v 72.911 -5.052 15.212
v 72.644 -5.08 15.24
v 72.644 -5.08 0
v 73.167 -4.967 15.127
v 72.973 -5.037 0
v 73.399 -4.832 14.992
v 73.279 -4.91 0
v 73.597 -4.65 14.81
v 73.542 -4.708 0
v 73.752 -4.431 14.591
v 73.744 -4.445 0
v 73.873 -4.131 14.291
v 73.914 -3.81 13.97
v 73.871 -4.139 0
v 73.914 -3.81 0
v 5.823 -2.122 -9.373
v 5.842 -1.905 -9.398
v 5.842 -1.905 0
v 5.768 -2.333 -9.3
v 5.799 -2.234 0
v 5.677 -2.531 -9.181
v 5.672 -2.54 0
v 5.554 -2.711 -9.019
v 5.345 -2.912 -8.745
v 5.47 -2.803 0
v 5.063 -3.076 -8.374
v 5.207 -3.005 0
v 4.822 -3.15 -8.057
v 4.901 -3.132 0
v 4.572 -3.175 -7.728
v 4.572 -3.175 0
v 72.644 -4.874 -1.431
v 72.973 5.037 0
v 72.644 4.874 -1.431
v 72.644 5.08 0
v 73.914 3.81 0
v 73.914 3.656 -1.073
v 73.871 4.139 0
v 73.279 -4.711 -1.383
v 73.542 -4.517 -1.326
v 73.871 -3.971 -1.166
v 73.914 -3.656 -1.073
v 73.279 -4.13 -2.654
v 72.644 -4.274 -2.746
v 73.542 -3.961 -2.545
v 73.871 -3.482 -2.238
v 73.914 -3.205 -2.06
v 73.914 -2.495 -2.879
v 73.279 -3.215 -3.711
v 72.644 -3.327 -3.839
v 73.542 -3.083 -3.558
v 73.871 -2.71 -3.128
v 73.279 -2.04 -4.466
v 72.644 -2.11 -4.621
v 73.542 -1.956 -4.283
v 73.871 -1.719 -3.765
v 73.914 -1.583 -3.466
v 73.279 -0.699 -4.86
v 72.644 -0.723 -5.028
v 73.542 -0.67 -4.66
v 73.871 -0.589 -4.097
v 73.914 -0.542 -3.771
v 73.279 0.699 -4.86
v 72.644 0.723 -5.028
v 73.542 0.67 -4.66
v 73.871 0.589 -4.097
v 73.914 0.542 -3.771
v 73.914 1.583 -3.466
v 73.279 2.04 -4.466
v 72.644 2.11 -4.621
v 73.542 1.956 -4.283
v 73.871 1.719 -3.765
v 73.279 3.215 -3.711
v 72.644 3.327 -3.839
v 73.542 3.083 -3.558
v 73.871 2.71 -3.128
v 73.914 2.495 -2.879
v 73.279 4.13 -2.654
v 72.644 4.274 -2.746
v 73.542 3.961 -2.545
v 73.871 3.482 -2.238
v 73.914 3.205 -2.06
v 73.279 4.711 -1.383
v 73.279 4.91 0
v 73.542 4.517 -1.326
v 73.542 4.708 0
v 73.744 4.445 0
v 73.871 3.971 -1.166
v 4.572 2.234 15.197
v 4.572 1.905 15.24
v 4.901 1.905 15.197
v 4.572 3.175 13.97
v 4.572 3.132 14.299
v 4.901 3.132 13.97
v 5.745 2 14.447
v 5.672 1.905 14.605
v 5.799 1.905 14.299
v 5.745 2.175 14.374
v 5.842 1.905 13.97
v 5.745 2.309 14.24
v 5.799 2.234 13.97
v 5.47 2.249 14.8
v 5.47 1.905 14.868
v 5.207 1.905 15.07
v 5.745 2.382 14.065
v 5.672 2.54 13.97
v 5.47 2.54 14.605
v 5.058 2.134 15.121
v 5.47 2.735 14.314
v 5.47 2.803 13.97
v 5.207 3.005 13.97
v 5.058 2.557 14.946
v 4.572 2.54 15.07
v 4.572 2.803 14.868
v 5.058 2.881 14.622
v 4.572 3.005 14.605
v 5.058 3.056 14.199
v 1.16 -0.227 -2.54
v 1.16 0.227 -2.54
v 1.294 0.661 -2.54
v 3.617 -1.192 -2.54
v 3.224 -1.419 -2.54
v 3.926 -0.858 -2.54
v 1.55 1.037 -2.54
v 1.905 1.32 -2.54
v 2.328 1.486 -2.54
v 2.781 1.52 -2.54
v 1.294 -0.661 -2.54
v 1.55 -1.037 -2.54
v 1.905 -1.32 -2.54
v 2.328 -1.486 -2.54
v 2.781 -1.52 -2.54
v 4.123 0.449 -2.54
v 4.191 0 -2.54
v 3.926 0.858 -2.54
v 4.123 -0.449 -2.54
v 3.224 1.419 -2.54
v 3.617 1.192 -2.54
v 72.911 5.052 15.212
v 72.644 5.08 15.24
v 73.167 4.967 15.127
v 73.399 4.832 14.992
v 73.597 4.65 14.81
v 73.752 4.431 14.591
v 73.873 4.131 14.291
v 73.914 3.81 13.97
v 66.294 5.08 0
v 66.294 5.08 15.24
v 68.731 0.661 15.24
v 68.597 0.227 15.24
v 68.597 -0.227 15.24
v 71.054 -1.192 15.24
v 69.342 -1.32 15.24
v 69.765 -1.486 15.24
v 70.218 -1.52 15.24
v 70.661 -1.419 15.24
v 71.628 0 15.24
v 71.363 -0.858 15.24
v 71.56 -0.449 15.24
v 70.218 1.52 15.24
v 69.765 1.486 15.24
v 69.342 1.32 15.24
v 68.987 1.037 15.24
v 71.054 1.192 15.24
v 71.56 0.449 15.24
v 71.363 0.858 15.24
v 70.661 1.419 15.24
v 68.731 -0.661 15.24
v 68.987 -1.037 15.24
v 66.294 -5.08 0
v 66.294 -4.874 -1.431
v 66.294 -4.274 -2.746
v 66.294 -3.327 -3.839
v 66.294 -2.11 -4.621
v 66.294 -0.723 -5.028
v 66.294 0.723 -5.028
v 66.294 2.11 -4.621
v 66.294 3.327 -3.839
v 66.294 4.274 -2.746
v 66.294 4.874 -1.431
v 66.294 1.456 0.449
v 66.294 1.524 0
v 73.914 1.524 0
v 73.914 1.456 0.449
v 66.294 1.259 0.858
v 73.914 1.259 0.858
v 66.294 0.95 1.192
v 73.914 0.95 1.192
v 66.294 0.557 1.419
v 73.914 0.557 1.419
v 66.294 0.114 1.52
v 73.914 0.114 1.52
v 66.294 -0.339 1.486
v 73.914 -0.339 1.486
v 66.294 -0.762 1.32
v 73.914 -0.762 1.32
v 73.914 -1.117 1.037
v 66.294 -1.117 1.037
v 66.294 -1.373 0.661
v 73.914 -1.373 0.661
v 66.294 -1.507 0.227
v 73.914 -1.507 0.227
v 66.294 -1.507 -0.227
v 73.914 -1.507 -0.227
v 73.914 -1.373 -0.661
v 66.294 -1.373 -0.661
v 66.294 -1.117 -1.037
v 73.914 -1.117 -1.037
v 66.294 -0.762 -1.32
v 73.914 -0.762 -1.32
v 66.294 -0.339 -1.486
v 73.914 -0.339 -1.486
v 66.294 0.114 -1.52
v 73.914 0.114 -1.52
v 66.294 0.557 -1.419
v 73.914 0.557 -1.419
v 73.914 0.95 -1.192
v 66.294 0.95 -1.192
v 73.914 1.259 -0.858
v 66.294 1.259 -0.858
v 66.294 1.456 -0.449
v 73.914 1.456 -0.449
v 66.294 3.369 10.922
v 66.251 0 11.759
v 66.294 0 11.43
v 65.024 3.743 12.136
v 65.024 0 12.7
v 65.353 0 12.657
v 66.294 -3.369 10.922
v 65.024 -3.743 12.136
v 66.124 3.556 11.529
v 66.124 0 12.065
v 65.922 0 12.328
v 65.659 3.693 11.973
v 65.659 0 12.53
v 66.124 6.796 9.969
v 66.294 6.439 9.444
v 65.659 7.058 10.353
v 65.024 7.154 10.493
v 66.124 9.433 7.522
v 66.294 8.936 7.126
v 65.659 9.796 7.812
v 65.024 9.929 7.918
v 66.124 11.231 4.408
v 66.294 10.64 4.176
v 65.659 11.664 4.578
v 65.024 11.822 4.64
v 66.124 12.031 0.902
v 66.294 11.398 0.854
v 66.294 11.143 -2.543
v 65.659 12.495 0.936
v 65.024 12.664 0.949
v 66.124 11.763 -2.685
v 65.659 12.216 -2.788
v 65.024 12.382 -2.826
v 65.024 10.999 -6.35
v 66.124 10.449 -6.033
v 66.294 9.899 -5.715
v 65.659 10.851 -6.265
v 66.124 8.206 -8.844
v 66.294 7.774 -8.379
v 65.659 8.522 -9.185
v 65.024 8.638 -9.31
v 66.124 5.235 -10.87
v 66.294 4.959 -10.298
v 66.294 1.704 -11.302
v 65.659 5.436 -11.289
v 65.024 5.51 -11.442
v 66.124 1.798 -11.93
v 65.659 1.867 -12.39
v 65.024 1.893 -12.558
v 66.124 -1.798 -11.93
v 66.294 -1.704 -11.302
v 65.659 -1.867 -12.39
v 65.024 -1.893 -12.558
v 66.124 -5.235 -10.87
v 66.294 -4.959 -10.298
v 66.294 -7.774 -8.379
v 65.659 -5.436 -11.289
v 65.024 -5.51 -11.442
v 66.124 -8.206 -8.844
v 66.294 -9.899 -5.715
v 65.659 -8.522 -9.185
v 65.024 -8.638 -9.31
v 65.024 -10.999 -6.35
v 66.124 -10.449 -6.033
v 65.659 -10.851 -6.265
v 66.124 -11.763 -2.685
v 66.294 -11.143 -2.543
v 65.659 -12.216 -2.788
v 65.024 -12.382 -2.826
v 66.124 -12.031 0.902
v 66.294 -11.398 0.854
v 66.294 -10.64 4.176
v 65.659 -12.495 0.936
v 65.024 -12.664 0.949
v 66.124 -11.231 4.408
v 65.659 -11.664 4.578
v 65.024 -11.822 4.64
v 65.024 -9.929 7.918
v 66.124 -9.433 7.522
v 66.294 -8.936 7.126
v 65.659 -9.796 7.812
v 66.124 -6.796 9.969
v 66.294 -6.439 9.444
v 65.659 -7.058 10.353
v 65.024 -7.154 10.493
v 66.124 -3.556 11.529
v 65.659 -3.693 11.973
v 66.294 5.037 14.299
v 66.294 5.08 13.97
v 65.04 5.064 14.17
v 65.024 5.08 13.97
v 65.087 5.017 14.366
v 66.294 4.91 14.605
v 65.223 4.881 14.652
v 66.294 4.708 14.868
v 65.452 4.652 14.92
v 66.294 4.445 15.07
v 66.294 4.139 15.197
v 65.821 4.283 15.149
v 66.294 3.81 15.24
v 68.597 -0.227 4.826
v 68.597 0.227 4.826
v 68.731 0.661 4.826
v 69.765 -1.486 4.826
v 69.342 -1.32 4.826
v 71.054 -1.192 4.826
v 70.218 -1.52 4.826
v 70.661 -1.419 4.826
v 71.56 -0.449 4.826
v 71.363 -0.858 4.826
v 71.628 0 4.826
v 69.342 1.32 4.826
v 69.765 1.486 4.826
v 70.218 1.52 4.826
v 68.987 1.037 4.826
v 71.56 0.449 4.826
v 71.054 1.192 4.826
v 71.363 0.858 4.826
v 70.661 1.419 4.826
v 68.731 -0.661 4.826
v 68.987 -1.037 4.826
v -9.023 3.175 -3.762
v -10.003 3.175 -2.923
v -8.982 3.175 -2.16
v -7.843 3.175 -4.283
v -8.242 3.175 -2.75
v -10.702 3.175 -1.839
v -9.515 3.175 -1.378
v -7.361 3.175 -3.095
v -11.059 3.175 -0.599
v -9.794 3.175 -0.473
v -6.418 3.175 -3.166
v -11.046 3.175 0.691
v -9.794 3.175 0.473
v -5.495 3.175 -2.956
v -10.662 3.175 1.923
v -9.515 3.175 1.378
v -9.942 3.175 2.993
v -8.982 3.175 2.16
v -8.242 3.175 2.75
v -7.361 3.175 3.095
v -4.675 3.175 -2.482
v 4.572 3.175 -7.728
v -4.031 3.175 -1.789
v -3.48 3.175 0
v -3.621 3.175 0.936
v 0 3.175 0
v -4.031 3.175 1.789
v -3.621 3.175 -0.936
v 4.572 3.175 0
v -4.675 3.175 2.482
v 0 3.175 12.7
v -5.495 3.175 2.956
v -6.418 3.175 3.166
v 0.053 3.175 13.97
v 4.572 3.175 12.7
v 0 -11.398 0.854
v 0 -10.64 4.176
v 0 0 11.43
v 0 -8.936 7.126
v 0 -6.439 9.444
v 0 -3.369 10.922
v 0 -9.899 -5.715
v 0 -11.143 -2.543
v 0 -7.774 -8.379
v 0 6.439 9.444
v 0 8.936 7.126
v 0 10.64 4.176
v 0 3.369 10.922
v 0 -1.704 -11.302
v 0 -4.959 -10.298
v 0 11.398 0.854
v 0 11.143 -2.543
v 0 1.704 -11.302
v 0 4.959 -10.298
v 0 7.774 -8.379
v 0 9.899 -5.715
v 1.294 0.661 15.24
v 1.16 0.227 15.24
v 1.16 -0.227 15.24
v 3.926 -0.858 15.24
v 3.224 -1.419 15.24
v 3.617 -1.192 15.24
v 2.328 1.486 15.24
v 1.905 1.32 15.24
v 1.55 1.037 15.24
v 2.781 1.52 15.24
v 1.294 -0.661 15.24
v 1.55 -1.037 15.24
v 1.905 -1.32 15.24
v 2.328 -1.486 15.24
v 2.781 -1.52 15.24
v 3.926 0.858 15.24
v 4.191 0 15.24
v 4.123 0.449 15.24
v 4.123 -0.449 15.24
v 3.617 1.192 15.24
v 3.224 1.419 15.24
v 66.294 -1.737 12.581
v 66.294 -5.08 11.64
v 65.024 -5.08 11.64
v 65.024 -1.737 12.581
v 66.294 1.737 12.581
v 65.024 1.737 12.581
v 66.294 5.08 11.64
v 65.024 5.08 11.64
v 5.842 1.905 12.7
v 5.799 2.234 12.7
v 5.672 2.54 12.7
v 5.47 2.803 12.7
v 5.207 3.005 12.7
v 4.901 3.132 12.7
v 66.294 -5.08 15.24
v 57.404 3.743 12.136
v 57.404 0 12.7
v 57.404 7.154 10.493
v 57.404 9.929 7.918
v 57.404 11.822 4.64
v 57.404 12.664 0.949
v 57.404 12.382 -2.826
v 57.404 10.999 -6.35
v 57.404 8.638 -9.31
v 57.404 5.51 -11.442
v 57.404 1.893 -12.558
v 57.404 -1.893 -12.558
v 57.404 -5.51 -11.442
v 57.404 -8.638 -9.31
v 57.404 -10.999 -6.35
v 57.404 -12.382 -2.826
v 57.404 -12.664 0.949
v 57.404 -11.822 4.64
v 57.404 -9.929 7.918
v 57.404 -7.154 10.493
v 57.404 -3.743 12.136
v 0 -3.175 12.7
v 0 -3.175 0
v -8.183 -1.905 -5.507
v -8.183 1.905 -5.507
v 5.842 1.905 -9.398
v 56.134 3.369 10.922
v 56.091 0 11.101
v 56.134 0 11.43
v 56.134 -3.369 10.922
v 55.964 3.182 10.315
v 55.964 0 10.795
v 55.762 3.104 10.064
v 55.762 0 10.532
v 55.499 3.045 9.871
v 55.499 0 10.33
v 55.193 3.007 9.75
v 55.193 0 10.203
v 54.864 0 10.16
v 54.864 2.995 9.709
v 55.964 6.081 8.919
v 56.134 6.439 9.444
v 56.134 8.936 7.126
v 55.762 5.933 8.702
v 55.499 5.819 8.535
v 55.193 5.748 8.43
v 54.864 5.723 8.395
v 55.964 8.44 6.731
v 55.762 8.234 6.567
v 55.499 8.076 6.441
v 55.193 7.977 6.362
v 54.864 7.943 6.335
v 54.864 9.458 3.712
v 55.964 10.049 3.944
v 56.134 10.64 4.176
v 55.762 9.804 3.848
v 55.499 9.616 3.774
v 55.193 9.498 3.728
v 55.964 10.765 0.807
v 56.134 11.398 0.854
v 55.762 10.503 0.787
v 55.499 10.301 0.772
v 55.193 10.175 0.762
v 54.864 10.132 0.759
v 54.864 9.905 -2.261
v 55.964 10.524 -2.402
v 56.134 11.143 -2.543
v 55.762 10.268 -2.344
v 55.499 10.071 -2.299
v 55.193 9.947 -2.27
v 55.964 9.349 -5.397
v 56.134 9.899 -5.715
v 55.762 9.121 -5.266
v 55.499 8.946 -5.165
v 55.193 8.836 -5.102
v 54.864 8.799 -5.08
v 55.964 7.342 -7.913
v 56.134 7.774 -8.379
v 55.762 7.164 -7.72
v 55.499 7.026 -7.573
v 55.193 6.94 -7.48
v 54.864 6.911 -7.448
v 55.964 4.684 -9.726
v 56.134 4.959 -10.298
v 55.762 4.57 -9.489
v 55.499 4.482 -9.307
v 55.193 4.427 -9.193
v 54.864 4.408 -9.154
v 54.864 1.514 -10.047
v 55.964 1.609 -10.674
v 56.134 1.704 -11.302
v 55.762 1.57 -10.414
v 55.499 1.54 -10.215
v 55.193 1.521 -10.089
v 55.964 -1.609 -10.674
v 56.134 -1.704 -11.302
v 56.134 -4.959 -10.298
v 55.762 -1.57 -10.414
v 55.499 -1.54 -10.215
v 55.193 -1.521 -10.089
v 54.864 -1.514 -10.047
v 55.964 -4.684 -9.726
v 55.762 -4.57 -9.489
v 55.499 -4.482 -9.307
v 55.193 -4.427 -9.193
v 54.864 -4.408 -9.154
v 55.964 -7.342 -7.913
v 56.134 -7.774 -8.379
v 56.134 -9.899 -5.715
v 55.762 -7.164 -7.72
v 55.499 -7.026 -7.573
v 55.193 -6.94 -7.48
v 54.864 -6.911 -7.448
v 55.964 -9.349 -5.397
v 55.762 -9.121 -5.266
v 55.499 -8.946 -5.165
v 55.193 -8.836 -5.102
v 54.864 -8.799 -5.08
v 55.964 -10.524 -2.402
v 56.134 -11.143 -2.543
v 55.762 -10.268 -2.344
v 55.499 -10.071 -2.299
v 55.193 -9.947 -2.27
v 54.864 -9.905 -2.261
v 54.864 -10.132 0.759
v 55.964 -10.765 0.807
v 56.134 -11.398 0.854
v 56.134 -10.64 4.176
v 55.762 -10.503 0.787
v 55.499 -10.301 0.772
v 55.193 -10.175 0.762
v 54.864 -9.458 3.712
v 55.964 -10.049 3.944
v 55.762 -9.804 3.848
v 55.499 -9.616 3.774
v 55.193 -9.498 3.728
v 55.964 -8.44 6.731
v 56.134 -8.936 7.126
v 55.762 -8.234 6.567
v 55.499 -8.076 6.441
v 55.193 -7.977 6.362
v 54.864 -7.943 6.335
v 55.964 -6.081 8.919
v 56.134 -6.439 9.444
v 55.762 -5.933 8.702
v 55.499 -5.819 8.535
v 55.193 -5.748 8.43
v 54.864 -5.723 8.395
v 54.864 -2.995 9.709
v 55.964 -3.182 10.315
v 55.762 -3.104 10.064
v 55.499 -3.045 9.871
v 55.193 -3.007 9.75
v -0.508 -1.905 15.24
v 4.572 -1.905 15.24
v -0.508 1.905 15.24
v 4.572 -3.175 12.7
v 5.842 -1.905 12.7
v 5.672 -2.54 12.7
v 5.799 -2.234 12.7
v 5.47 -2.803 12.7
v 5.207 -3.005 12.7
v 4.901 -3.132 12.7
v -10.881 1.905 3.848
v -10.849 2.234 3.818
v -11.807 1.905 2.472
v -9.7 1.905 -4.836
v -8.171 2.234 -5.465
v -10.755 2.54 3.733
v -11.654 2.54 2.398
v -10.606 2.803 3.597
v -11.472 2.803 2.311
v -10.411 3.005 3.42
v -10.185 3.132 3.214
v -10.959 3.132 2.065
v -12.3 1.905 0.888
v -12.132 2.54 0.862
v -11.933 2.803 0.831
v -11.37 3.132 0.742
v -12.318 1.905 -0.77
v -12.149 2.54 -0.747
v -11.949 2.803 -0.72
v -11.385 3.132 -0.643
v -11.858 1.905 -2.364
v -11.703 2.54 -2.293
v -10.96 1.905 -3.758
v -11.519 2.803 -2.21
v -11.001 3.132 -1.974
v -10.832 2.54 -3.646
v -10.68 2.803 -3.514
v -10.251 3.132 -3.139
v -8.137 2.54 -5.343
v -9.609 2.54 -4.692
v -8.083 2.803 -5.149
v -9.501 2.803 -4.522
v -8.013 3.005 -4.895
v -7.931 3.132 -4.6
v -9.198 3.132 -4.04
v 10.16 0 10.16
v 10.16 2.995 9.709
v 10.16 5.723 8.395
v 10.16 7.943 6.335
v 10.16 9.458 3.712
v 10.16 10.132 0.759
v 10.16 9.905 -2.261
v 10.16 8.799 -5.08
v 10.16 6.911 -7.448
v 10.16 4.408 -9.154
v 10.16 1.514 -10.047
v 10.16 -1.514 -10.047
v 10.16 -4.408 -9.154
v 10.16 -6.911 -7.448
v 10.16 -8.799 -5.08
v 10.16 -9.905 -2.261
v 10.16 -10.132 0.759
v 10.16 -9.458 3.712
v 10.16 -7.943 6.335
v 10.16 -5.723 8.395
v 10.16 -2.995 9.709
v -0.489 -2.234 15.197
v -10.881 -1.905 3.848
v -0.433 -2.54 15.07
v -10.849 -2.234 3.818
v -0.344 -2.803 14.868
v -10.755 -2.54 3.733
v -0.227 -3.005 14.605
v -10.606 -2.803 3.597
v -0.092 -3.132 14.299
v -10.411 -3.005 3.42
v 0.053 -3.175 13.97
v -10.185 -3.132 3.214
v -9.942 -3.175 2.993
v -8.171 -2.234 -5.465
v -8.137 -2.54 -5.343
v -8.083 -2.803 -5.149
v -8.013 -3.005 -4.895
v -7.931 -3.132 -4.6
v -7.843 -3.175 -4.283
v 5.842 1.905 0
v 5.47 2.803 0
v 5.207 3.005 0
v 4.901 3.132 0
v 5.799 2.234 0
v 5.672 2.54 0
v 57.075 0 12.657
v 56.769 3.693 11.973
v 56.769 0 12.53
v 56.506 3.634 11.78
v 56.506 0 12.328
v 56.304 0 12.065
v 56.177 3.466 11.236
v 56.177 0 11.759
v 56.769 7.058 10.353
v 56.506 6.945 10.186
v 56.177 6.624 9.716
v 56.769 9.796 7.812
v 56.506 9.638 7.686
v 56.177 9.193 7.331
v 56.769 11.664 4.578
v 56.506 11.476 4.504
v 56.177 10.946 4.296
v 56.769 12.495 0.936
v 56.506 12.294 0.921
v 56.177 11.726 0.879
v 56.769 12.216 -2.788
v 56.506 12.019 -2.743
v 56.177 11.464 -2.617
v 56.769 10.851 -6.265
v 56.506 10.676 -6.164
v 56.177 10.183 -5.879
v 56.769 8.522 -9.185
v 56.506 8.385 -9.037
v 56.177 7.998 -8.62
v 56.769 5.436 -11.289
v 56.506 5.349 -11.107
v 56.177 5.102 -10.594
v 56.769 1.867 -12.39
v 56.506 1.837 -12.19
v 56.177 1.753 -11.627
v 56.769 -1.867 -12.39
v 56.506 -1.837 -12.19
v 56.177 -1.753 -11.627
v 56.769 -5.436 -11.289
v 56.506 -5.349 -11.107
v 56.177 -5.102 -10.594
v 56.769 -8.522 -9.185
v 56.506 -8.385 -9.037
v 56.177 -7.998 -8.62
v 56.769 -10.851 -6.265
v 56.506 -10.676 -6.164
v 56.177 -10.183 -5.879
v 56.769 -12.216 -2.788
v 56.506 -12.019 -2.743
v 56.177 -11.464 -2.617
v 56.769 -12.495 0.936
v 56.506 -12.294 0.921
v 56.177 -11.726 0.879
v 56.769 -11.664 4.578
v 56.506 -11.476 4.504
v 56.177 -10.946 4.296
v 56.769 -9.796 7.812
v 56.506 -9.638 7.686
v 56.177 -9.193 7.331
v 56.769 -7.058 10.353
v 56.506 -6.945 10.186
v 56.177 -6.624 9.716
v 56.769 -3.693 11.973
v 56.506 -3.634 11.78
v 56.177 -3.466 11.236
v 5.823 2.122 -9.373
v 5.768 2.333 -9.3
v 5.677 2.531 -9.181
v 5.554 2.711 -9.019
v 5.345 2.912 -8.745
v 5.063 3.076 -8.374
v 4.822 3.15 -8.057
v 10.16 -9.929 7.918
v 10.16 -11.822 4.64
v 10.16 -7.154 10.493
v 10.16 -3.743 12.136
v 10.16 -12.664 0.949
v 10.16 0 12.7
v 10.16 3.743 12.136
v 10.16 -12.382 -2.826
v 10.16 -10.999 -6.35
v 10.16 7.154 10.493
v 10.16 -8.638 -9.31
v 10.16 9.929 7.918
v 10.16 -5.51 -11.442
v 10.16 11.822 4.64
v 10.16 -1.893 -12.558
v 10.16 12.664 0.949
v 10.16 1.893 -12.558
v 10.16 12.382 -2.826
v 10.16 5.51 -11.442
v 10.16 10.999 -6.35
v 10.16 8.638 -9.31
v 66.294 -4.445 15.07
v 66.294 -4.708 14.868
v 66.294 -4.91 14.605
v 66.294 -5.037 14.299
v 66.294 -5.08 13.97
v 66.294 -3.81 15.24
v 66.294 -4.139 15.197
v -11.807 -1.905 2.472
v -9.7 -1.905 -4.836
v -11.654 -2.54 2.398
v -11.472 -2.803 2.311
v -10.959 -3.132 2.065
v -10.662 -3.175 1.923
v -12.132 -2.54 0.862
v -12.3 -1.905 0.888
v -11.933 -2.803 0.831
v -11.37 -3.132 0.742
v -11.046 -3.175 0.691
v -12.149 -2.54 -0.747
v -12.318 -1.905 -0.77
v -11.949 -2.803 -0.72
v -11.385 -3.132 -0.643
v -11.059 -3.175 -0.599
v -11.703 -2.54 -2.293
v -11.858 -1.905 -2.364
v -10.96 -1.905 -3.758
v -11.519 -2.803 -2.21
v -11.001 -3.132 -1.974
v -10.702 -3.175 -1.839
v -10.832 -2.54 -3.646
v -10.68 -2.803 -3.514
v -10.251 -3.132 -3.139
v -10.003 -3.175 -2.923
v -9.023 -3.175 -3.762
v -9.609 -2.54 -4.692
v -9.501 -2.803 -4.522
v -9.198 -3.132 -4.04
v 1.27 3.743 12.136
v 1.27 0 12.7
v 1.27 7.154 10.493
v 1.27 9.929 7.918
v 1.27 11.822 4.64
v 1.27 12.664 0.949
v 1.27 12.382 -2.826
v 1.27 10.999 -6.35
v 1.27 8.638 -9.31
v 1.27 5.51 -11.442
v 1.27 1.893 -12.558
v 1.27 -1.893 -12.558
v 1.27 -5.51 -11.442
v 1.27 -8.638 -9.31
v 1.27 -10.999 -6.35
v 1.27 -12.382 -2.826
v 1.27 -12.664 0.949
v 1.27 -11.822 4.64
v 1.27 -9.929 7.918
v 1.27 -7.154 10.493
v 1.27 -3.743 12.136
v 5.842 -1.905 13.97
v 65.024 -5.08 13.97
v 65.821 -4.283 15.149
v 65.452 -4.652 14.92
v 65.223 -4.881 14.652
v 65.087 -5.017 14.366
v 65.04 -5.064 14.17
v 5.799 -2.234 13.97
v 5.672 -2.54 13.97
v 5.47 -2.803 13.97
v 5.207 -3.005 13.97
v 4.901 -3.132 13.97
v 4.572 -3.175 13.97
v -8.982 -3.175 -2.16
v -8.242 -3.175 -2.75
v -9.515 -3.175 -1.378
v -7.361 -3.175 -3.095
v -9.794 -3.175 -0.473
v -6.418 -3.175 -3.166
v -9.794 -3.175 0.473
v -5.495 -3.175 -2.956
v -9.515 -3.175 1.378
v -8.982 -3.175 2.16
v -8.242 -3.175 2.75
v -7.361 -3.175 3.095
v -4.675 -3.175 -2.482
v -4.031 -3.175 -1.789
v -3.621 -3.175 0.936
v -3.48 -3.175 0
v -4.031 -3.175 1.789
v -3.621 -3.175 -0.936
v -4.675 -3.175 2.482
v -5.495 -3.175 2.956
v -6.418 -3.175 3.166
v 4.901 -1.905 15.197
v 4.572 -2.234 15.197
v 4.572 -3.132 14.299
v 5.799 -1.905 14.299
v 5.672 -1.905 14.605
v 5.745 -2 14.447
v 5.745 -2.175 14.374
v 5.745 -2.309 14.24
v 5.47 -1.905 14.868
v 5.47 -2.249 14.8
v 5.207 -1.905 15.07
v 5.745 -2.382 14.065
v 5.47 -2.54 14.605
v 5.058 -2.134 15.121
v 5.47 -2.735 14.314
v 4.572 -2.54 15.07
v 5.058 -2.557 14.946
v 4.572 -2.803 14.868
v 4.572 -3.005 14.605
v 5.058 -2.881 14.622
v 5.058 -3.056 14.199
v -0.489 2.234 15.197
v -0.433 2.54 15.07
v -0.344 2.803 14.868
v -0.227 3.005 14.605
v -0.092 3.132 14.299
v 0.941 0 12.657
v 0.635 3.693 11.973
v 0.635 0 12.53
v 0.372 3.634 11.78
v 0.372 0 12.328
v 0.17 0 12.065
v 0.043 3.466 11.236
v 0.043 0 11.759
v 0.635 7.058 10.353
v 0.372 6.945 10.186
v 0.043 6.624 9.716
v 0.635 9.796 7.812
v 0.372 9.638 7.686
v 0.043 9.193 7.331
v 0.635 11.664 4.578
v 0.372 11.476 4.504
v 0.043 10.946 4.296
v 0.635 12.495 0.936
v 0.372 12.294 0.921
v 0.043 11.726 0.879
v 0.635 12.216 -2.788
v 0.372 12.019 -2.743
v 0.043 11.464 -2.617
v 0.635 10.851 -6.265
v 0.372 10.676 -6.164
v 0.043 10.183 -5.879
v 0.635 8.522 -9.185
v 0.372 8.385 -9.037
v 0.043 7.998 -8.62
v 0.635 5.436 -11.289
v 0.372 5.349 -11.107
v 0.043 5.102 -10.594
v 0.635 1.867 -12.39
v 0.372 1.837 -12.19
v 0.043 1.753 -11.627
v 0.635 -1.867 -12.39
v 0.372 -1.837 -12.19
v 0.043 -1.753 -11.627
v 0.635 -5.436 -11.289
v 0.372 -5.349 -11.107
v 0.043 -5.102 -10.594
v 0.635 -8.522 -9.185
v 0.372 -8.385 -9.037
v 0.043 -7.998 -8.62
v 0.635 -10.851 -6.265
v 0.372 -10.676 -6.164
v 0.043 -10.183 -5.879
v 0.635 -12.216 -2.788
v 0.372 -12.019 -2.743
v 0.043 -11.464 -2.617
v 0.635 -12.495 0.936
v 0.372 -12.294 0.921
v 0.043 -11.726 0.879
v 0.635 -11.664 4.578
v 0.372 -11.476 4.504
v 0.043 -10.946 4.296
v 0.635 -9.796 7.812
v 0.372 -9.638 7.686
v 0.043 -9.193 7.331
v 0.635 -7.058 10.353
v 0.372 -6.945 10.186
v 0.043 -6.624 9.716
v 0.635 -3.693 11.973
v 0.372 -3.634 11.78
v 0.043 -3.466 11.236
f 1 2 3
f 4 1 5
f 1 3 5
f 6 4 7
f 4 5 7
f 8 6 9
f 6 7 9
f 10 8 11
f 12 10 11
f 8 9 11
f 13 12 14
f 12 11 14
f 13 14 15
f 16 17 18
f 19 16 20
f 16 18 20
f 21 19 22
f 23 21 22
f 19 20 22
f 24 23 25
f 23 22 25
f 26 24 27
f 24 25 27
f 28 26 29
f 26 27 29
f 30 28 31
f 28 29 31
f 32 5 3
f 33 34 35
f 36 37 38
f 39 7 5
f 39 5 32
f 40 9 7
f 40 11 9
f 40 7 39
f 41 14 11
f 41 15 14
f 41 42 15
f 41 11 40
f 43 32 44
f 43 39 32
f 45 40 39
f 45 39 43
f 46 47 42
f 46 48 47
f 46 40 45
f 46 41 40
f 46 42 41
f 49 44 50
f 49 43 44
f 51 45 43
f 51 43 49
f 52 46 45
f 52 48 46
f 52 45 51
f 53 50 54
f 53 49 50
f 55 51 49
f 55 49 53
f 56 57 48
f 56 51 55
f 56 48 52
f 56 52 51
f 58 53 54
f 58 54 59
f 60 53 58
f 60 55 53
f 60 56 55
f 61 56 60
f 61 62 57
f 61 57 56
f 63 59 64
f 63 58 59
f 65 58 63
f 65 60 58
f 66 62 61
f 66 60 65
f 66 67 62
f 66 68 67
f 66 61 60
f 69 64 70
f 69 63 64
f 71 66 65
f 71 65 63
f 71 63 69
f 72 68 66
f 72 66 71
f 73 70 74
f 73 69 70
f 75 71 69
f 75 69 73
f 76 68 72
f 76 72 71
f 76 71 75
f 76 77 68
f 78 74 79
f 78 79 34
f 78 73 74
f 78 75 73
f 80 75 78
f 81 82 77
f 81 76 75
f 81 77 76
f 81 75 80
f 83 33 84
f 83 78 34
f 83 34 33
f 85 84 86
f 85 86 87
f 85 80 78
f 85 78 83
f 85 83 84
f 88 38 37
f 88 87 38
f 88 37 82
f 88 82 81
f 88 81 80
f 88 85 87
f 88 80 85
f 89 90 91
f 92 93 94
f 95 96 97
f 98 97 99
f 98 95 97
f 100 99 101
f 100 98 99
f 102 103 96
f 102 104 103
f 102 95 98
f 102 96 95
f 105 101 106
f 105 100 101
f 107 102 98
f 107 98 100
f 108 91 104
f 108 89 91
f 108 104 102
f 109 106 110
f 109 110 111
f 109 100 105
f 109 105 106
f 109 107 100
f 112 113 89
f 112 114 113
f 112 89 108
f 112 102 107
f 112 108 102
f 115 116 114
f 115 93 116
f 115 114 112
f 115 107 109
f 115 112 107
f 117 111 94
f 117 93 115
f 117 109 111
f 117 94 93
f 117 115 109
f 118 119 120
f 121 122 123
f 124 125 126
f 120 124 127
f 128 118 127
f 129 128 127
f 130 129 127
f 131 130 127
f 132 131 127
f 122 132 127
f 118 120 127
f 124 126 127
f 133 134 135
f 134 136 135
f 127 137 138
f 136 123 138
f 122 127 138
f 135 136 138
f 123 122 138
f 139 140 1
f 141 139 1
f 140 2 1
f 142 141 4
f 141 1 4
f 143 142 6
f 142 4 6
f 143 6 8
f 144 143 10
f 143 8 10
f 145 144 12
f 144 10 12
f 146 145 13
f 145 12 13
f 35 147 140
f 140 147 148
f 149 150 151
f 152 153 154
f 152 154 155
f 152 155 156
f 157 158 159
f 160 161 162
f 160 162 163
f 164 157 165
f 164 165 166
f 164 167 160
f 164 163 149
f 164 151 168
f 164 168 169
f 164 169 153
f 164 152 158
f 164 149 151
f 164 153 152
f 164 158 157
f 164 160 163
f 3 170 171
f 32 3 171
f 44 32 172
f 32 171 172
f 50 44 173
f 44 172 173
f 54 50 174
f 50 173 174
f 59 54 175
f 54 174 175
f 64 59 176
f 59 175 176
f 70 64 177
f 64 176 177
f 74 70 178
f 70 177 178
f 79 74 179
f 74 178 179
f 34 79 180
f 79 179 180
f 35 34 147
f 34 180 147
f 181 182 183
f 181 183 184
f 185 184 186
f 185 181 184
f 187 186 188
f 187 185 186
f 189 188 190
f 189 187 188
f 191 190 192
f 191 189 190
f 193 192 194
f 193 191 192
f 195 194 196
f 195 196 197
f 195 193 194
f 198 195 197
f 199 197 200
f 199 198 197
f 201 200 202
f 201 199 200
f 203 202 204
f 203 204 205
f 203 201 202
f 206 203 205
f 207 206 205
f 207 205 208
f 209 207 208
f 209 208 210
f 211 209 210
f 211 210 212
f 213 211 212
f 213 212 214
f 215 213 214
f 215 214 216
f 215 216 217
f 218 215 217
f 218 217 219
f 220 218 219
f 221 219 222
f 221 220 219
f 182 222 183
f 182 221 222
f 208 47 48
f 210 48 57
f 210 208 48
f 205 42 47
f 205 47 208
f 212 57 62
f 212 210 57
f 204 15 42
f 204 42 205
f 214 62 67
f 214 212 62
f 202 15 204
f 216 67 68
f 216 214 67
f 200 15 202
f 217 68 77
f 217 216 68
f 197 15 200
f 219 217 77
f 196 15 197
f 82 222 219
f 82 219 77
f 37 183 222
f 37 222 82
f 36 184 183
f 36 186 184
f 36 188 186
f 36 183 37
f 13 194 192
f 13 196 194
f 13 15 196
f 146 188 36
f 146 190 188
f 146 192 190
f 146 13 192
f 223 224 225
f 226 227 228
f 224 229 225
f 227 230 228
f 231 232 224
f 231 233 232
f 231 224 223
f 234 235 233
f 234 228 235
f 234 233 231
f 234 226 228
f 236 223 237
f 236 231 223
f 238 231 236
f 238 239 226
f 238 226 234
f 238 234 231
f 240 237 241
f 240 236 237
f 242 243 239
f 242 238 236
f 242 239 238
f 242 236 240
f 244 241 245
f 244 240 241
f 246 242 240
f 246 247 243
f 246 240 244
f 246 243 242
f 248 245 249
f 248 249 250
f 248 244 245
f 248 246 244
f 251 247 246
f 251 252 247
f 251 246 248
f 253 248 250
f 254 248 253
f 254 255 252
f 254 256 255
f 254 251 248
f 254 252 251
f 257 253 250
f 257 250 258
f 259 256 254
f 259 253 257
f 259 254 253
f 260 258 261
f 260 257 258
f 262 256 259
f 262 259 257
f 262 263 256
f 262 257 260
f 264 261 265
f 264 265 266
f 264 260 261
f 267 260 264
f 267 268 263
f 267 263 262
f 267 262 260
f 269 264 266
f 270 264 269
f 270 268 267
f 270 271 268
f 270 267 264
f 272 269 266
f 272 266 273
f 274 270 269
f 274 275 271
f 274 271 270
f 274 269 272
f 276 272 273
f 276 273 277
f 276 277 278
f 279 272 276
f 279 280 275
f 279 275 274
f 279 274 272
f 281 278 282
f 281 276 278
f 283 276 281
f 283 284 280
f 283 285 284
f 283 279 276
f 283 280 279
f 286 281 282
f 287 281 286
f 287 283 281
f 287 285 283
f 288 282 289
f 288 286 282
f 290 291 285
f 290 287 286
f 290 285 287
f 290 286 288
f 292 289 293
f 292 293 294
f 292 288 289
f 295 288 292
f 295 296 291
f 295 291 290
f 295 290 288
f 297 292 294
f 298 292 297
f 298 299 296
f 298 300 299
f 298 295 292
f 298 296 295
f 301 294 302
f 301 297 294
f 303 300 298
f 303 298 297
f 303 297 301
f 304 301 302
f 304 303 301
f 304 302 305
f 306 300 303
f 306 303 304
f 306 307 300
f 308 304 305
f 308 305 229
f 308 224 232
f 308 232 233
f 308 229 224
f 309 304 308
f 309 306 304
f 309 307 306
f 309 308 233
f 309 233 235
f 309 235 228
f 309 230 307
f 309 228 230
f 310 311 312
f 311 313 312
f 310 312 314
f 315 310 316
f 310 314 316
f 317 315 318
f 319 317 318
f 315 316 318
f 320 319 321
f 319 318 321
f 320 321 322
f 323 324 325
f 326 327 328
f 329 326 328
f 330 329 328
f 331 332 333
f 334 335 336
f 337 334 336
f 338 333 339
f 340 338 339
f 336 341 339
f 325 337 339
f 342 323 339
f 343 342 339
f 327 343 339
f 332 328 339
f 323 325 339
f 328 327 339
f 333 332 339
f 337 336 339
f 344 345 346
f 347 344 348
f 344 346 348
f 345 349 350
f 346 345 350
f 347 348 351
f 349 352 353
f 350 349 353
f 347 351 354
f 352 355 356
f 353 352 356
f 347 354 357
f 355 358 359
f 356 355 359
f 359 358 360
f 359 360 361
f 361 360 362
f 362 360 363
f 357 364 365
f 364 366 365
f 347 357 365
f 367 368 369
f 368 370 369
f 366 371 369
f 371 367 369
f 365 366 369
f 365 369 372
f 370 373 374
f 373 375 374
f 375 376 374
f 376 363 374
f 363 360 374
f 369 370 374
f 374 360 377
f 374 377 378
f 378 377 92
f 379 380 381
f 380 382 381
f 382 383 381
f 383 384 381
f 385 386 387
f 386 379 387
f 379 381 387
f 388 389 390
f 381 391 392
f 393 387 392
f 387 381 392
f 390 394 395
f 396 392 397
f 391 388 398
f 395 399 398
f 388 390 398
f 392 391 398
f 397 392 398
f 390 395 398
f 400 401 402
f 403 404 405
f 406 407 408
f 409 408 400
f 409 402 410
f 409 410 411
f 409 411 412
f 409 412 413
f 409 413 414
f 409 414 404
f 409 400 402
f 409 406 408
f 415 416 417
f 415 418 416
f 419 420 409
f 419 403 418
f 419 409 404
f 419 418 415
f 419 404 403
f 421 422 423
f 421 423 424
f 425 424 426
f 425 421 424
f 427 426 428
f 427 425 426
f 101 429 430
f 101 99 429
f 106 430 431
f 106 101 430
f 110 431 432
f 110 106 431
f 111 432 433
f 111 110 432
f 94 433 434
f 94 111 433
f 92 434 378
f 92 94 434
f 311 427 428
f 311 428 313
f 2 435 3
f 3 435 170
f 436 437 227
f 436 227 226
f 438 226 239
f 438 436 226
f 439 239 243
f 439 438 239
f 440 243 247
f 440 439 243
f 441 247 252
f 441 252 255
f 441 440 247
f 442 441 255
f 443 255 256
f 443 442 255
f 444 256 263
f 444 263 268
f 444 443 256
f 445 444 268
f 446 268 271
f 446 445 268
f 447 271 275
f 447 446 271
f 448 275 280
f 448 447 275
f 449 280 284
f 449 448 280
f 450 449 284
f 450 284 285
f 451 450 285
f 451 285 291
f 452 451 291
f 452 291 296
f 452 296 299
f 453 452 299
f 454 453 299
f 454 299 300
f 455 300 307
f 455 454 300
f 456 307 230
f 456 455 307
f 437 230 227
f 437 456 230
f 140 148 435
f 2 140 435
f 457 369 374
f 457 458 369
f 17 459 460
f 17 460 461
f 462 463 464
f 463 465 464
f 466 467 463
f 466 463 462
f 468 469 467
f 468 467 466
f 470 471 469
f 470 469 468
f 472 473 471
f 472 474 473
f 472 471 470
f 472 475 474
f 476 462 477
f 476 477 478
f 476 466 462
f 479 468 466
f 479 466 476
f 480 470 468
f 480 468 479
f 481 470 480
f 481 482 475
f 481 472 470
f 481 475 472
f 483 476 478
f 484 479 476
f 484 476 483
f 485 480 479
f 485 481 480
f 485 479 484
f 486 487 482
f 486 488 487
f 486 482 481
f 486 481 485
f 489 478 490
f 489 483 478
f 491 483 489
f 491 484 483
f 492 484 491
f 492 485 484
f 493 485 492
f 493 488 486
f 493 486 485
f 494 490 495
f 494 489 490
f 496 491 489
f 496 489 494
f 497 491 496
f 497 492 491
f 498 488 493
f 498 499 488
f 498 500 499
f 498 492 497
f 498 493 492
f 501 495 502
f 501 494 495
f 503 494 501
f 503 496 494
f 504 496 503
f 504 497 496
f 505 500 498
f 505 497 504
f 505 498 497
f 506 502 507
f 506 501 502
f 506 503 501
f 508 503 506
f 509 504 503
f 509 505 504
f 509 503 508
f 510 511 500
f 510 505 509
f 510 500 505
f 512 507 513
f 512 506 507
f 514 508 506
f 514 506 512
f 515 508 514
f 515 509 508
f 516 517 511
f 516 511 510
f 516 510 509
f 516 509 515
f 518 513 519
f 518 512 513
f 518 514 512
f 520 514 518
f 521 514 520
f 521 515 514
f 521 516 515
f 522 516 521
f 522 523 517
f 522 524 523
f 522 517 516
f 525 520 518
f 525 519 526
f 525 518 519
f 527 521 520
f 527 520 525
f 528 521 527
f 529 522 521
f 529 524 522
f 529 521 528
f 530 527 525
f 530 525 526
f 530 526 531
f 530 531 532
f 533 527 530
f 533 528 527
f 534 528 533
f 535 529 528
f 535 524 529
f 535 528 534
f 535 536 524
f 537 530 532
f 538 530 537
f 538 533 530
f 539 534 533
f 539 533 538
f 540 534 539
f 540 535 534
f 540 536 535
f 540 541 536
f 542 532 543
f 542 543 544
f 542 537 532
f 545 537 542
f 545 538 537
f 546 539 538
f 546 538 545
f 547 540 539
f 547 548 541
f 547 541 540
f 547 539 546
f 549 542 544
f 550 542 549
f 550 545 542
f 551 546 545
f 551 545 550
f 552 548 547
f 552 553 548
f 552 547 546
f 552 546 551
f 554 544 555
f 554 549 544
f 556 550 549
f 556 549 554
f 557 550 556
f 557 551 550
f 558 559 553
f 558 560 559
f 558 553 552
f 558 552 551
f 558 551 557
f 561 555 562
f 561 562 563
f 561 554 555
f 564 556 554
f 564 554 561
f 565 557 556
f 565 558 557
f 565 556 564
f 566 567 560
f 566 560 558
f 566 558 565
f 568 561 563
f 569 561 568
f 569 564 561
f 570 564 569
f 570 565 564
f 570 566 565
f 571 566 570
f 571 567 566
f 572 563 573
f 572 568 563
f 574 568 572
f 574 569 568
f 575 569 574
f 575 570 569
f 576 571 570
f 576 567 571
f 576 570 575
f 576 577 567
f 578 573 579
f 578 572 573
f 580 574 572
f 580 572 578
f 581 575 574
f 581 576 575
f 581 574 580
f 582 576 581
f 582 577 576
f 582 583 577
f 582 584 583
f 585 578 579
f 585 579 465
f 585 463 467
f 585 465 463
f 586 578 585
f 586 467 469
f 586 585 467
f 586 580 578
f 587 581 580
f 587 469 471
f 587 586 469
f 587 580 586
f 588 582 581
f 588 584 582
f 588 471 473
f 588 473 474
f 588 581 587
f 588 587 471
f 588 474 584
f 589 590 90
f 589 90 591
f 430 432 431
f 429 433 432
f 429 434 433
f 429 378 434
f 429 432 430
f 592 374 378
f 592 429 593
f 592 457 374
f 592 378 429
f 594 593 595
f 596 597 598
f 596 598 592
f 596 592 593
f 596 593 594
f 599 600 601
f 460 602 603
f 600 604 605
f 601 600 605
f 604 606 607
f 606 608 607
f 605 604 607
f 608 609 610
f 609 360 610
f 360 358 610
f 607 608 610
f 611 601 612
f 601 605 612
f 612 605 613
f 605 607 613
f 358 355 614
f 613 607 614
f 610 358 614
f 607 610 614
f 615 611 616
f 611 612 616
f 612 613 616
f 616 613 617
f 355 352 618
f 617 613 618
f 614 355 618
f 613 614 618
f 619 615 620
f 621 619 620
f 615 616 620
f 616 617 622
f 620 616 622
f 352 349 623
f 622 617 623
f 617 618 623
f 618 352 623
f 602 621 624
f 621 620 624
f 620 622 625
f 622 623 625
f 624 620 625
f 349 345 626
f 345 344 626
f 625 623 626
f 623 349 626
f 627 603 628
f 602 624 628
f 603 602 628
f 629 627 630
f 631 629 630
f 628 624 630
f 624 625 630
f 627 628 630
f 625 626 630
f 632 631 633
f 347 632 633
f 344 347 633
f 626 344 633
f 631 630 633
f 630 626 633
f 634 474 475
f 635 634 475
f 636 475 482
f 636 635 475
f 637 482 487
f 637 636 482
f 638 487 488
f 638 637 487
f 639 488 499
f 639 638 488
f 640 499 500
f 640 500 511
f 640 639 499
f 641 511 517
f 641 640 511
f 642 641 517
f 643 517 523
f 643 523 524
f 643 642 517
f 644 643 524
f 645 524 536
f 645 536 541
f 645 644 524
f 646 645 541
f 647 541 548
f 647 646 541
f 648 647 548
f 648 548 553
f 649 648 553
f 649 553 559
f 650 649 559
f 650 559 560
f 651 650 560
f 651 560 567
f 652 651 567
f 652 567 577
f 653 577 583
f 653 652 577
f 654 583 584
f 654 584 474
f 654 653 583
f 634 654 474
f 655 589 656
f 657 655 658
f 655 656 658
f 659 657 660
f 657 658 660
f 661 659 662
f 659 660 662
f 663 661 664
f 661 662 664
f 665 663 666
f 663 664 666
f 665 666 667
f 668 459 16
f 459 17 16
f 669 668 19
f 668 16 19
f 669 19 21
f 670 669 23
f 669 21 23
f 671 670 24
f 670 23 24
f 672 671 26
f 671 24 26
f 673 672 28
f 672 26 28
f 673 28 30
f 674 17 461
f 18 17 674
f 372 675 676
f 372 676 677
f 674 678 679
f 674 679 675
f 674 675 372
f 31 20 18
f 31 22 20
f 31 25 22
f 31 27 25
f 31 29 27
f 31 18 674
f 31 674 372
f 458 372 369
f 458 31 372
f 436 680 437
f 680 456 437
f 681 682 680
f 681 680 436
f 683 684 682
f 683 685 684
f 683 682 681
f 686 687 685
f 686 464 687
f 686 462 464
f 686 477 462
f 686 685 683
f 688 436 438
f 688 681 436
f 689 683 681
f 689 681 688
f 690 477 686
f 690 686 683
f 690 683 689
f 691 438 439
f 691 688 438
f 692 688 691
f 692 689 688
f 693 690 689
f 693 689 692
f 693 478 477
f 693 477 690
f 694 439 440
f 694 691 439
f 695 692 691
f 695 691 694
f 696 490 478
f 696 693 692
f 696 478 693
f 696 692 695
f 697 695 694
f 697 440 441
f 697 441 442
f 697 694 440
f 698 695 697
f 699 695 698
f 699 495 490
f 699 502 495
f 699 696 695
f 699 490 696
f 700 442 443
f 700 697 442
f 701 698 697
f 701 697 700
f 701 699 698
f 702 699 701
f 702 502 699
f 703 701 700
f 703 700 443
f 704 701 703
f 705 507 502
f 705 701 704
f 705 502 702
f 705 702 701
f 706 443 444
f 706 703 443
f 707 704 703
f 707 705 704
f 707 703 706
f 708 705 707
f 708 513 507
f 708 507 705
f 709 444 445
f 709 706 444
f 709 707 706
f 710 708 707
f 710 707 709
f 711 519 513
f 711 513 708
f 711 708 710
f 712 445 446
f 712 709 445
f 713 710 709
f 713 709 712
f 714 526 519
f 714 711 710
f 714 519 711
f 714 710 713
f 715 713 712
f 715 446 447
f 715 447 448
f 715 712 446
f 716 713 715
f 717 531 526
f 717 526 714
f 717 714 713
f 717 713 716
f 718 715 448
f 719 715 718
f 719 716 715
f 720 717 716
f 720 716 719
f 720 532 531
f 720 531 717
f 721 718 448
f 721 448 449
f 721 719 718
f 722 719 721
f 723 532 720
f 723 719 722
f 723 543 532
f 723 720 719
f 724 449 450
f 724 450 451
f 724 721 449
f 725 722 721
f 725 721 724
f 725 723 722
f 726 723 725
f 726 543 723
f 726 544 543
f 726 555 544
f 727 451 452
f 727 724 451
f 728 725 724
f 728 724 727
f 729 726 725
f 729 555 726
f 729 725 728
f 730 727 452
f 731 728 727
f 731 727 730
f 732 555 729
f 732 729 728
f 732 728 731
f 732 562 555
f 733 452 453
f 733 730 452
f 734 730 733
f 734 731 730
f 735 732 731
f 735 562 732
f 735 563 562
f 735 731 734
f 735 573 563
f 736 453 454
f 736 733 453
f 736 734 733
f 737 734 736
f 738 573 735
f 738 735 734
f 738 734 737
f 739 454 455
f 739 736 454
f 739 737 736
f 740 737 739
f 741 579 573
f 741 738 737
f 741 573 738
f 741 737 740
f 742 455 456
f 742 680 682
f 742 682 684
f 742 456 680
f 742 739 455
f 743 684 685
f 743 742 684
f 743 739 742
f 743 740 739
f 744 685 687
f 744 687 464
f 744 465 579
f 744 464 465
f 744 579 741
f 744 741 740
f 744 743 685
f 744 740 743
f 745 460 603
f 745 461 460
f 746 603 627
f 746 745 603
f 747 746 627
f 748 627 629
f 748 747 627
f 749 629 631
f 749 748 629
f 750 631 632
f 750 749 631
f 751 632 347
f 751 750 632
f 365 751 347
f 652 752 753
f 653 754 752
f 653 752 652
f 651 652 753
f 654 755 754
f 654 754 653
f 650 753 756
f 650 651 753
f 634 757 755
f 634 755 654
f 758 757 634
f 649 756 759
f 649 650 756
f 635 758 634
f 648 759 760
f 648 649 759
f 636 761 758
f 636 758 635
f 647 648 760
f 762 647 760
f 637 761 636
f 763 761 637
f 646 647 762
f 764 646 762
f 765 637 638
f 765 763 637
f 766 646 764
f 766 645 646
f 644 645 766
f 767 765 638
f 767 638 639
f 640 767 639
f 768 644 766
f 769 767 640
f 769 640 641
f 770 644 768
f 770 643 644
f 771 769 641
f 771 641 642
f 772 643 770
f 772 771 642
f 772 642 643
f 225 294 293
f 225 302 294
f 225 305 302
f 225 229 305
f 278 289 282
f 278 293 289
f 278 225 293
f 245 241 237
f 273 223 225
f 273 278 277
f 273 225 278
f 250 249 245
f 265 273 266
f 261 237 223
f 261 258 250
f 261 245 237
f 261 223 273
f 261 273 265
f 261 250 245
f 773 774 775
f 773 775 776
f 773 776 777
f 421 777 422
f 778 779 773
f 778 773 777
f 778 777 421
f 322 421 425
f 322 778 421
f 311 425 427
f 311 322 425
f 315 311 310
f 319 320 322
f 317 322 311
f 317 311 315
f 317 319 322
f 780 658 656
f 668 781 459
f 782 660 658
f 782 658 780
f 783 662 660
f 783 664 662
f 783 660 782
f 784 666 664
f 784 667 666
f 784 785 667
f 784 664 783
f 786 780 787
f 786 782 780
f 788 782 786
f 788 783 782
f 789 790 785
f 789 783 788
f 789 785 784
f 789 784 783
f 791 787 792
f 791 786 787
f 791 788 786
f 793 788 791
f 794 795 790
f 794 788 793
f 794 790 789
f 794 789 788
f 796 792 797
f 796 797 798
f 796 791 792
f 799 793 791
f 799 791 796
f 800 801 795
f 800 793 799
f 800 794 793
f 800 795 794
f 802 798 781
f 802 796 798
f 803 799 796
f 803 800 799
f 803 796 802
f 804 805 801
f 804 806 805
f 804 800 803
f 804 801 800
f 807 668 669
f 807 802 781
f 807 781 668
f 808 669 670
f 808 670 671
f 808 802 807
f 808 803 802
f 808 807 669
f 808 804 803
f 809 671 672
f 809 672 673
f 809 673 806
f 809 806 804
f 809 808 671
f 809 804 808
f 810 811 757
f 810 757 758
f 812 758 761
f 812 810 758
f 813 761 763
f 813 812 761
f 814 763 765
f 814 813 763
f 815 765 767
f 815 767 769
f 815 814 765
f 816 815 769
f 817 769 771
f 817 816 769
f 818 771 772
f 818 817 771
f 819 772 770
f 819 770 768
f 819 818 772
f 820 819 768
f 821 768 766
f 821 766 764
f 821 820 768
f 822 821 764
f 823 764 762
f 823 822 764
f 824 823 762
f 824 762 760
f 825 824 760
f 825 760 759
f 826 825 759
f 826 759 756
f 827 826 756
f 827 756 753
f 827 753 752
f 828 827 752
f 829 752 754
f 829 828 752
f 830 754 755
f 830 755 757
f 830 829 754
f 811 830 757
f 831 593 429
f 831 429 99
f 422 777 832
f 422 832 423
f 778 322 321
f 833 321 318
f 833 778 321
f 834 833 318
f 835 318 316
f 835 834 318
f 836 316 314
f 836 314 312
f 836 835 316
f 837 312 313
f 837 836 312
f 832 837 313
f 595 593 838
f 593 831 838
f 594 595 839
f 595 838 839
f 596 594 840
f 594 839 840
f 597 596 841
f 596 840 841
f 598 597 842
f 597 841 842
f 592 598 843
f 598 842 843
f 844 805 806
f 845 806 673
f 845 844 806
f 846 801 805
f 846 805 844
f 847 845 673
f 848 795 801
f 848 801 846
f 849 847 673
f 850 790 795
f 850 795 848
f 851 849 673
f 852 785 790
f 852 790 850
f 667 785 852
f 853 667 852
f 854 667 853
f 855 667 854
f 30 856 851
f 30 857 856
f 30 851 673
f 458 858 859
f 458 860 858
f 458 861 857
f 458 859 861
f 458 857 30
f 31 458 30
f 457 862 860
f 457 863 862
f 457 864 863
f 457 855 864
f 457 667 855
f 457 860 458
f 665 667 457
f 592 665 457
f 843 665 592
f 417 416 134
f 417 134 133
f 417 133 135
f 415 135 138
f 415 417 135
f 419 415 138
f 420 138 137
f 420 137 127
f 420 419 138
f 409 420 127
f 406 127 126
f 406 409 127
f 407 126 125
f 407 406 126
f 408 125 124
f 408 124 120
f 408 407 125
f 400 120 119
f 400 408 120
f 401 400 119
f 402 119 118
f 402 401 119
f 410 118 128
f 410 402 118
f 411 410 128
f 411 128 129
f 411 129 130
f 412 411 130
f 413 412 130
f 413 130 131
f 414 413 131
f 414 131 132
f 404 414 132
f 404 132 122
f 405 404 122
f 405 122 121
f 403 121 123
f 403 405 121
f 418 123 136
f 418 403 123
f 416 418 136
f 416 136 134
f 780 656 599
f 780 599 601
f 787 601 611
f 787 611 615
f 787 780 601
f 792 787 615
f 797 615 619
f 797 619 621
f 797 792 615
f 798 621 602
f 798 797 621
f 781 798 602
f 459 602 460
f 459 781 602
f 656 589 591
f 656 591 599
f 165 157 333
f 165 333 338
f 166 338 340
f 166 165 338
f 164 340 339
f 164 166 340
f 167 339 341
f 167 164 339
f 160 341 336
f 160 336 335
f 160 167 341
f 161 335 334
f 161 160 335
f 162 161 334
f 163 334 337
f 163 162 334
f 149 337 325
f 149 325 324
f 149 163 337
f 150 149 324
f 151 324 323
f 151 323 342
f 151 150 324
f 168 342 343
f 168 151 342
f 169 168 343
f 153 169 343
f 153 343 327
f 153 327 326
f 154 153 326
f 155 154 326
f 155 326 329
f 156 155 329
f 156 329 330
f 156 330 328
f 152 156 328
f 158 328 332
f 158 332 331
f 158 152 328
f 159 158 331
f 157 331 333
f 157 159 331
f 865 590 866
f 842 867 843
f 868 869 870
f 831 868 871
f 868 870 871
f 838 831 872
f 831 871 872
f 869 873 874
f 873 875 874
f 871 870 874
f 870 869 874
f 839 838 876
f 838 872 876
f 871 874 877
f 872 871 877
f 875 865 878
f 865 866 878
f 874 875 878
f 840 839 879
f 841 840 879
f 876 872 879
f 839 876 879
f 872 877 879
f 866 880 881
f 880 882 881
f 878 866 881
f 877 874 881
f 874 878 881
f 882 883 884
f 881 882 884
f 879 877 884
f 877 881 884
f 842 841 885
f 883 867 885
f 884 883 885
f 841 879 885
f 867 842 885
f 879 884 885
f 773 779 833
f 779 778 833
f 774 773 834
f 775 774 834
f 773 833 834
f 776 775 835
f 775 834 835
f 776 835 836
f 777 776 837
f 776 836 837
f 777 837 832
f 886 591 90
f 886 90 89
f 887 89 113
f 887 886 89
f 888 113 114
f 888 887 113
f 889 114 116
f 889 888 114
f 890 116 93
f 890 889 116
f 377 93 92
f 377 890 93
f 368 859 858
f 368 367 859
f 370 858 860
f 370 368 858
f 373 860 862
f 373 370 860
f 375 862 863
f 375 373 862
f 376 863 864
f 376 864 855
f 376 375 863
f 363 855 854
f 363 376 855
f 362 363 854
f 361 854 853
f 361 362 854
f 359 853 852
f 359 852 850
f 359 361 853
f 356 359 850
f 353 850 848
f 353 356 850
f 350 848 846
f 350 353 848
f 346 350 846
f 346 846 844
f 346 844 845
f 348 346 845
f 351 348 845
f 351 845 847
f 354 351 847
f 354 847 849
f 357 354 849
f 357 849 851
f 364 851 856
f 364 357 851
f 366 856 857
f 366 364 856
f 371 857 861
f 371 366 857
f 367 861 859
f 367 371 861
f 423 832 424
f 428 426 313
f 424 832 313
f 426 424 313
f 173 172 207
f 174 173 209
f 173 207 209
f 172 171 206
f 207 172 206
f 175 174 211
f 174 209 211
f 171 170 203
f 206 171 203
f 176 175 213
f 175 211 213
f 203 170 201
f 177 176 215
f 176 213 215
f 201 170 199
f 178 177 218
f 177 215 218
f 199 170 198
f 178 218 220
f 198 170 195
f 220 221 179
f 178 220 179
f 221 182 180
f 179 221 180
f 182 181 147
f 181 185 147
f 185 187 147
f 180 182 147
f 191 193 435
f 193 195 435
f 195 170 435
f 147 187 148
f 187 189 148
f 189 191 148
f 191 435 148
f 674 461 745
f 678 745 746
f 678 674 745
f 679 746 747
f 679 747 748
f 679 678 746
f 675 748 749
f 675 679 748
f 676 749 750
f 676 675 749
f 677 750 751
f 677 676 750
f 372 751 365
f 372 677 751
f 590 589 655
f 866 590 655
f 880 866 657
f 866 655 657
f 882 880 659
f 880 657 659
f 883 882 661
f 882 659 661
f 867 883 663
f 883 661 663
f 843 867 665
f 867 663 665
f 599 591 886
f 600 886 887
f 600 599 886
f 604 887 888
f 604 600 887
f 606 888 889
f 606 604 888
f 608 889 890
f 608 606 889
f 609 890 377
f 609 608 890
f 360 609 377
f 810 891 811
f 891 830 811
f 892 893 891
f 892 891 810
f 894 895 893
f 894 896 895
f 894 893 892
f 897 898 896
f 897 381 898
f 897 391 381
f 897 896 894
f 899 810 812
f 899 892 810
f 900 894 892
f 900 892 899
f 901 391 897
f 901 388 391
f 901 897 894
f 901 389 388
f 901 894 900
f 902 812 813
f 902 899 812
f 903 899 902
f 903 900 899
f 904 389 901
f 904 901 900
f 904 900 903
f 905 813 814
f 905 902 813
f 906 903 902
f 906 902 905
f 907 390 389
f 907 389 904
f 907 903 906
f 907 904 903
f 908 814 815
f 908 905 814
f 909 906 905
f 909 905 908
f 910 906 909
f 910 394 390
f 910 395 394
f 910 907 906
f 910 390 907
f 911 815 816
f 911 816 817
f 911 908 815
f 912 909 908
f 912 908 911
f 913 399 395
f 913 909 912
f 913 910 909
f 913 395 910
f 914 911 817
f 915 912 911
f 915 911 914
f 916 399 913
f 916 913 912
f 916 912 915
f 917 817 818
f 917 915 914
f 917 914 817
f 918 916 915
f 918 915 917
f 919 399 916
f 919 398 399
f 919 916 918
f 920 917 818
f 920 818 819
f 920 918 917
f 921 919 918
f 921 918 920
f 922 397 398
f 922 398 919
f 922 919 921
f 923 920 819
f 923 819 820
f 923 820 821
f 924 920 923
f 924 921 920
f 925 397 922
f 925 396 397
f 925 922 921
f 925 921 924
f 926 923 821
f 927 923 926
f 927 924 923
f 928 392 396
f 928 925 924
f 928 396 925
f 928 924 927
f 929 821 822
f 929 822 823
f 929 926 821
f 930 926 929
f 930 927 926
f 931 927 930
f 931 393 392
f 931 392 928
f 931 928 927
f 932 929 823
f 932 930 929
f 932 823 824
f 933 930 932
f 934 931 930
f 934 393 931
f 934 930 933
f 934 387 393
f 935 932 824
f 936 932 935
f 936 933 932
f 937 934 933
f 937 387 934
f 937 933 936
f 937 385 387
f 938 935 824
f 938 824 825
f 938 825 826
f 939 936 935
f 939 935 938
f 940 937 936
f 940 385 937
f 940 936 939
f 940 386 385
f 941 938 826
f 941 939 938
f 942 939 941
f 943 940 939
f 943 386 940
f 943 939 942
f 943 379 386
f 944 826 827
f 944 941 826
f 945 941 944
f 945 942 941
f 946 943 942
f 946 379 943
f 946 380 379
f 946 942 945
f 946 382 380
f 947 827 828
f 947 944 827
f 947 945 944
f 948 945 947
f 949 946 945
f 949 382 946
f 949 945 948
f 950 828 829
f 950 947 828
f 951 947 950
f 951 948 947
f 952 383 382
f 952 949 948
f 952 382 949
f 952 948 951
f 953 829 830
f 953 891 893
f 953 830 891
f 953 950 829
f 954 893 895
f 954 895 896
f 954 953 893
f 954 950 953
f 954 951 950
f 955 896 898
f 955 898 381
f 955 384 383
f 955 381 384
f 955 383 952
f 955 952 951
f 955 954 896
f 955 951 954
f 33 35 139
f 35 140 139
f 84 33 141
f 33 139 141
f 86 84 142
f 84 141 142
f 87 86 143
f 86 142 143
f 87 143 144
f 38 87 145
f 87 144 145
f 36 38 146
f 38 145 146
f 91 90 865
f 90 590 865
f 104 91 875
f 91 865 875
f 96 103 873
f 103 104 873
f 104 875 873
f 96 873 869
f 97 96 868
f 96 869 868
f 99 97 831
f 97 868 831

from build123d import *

# Parameters (mm, degrees)
F0_W     = 5.842
F0_H     = 12.7
F0_R     = 3.175
F2_DEPTH = 3.175
F3_R     = 1.524
F4_DEPTH = 7.62
F5_DEPTH = 1.27
F6_R     = 1.524
F7_DEPTH = 10.414
F8_R     = 1.524
F9_DEPTH = 17.78
F10_R    = 1.26999
F10_2_R  = 1.26999
F10_3_R  = 1.26999
F10_4_R  = 1.26999


# Not quite as in the source:
# - a fillet or chamfer is up to 0.001 mm smaller than in the source, because OpenCascade refuses the exact size


with BuildPart() as f1:
    # F0 (on Front) → F1 (revolve)
    with BuildSketch(Plane.XZ):
        Polygon((5.842, 12.7), (5.842, 0), (66.294, 0), (66.294, 12.7), (56.134, 12.7), (56.134, 10.16), (10.16, 10.16), (10.16, 12.7), align=None)
        with Locations((2.921, 6.35)):
            Rectangle(F0_W, F0_H)
    revolve(axis=Axis((33.147, 0, 0), (-1, 0, 0)))

    # F10 (radius 1.27 in the source; OpenCascade refuses exactly that, so slightly less here)
    f10_edges = [f1.edges().sort_by_distance(p)[0] for p in [
        (66.294, 0, -12.7),
        (0, 0, -12.7),
        (56.134, 0, -12.7),
        (56.134, 0, -10.16),
    ]]
    fillet(f10_edges, radius=F10_R)


with BuildPart() as f2:
    # F0 (on Front) → F2 (new body, symmetric)
    with BuildSketch(Plane.XZ):
        with BuildLine():
            Line((-0.9398, 0), (0, 0))
            Line((0, 0), (0, 12.7))
            Line((0, 12.7), (5.842, 12.7))
            Line((5.842, 12.7), (5.842, 15.24))
            Line((5.842, 15.24), (-0.508, 15.24))
            Line((-0.508, 15.24), (-10.8806298187, 3.8475430269))
            ThreePointArc((-10.8806298187, 3.8475430269), (-4.5919612295, 5.3297205562), (-0.9398, 0))
        make_face()
        with BuildLine():
            Line((5.842, 0), (0, 0))
            Line((0, 0), (-0.9398, 0))
            ThreePointArc((-0.9398, 0), (-3.1957909266, -4.5493385486), (-8.1826630726, -5.5069827884))
            Line((-8.1826630726, -5.5069827884), (5.842, -9.398))
            Line((5.842, -9.398), (5.842, 0))
        make_face()
        with BuildLine():
            ThreePointArc((-8.1826630726, -5.5069827884), (-3.1957909266, -4.5493385486), (-0.9398, 0))
            ThreePointArc((-0.9398, 0), (-4.5919612295, 5.3297205562), (-10.8806298187, 3.8475430269))
            ThreePointArc((-10.8806298187, 3.8475430269), (-12.1459778134, -1.5837270034), (-8.1826630726, -5.5069827884))
        make_face()
        with Locations((-6.6548, 0)):
            Circle(F0_R, mode=Mode.SUBTRACT)
    extrude(amount=F2_DEPTH, both=True)

    # F10#2 (radius 1.27 in the source; OpenCascade refuses exactly that, so slightly less here)
    f10_2_edges = [f2.edges().sort_by_distance(p)[0] for p in [
        (-12.145978, 3.175, -1.583727),
        (-5.694315, 3.175, 9.543772),
        (-5.694315, -3.175, 9.543772),
        (-12.145978, -3.175, -1.583727),
        (2.667, 3.175, 15.24),
        (2.667, -3.175, 15.24),
        (5.842, 0, 15.24),
        (5.842, -3.175, 13.97),
        (5.842, -3.175, -4.699),
        (5.842, 3.175, 13.97),
        (5.842, 3.175, -4.699),
        (-1.170332, 3.175, -7.452491),
        (-1.170332, -3.175, -7.452491),
    ]]
    fillet(f10_2_edges, radius=F10_2_R)


with BuildPart() as f4:
    # F3 (on face) → F4 (new body)
    with BuildSketch(Plane.YZ.offset(66.294)):
        with BuildLine():
            ThreePointArc((-5.08, 0), (0, -5.08), (5.08, 0))
            ThreePointArc((5.08, 0), (0, 5.08), (-5.08, 0))
        make_face()
        Circle(F3_R, mode=Mode.SUBTRACT)
        with BuildLine():
            ThreePointArc((-5.08, 0), (0, 5.08), (5.08, 0))
            Line((5.08, 0), (5.08, 15.24))
            Line((5.08, 15.24), (-5.08, 15.24))
            Line((-5.08, 15.24), (-5.08, 0))
        make_face()
    extrude(amount=F4_DEPTH)

    # F10#3 (radius 1.27 in the source; OpenCascade refuses exactly that, so slightly less here)
    f10_3_edges = [f4.edges().sort_by_distance(p)[0] for p in [
        (73.914, 5.08, 7.62),
        (73.914, 0, 15.24),
        (73.914, 0, -5.08),
        (73.914, -5.08, 7.62),
    ]]
    fillet(f10_3_edges, radius=F10_3_R)


with BuildPart() as f5:
    # F3 (on face) → F5 (new body)
    with BuildSketch(Plane.YZ.offset(66.294)):
        with BuildLine():
            ThreePointArc((-5.08, 11.6397422652), (0, 12.7), (5.08, 11.6397422652))
            Line((5.08, 11.6397422652), (5.08, 15.24))
            Line((5.08, 15.24), (-5.08, 15.24))
            Line((-5.08, 15.24), (-5.08, 11.6397422652))
        make_face()
    extrude(amount=-F5_DEPTH)

    # F10#4 (radius 1.27 in the source; OpenCascade refuses exactly that, so slightly less here)
    f10_4_edges = [f5.edges().sort_by_distance(p)[0] for p in [
        (65.024, 0, 15.24),
        (65.659, -5.08, 15.24),
        (65.659, 5.08, 15.24),
    ]]
    fillet(f10_4_edges, radius=F10_4_R)


with BuildPart() as f7:
    # F6 (on face) → F7 (new body)
    with BuildSketch(Plane.XY.offset(15.24)):
        with Locations((70.104, 0)):
            Circle(F6_R)
    extrude(amount=-F7_DEPTH)


with BuildPart() as f9:
    # F8 (on face) → F9 (new body)
    with BuildSketch(Plane.XY.offset(15.24)):
        with Locations((2.667, 0)):
            Circle(F8_R)
    extrude(amount=-F9_DEPTH)


solid = Compound([f1.part, f2.part, f4.part, f5.part, f7.part, f9.part])
